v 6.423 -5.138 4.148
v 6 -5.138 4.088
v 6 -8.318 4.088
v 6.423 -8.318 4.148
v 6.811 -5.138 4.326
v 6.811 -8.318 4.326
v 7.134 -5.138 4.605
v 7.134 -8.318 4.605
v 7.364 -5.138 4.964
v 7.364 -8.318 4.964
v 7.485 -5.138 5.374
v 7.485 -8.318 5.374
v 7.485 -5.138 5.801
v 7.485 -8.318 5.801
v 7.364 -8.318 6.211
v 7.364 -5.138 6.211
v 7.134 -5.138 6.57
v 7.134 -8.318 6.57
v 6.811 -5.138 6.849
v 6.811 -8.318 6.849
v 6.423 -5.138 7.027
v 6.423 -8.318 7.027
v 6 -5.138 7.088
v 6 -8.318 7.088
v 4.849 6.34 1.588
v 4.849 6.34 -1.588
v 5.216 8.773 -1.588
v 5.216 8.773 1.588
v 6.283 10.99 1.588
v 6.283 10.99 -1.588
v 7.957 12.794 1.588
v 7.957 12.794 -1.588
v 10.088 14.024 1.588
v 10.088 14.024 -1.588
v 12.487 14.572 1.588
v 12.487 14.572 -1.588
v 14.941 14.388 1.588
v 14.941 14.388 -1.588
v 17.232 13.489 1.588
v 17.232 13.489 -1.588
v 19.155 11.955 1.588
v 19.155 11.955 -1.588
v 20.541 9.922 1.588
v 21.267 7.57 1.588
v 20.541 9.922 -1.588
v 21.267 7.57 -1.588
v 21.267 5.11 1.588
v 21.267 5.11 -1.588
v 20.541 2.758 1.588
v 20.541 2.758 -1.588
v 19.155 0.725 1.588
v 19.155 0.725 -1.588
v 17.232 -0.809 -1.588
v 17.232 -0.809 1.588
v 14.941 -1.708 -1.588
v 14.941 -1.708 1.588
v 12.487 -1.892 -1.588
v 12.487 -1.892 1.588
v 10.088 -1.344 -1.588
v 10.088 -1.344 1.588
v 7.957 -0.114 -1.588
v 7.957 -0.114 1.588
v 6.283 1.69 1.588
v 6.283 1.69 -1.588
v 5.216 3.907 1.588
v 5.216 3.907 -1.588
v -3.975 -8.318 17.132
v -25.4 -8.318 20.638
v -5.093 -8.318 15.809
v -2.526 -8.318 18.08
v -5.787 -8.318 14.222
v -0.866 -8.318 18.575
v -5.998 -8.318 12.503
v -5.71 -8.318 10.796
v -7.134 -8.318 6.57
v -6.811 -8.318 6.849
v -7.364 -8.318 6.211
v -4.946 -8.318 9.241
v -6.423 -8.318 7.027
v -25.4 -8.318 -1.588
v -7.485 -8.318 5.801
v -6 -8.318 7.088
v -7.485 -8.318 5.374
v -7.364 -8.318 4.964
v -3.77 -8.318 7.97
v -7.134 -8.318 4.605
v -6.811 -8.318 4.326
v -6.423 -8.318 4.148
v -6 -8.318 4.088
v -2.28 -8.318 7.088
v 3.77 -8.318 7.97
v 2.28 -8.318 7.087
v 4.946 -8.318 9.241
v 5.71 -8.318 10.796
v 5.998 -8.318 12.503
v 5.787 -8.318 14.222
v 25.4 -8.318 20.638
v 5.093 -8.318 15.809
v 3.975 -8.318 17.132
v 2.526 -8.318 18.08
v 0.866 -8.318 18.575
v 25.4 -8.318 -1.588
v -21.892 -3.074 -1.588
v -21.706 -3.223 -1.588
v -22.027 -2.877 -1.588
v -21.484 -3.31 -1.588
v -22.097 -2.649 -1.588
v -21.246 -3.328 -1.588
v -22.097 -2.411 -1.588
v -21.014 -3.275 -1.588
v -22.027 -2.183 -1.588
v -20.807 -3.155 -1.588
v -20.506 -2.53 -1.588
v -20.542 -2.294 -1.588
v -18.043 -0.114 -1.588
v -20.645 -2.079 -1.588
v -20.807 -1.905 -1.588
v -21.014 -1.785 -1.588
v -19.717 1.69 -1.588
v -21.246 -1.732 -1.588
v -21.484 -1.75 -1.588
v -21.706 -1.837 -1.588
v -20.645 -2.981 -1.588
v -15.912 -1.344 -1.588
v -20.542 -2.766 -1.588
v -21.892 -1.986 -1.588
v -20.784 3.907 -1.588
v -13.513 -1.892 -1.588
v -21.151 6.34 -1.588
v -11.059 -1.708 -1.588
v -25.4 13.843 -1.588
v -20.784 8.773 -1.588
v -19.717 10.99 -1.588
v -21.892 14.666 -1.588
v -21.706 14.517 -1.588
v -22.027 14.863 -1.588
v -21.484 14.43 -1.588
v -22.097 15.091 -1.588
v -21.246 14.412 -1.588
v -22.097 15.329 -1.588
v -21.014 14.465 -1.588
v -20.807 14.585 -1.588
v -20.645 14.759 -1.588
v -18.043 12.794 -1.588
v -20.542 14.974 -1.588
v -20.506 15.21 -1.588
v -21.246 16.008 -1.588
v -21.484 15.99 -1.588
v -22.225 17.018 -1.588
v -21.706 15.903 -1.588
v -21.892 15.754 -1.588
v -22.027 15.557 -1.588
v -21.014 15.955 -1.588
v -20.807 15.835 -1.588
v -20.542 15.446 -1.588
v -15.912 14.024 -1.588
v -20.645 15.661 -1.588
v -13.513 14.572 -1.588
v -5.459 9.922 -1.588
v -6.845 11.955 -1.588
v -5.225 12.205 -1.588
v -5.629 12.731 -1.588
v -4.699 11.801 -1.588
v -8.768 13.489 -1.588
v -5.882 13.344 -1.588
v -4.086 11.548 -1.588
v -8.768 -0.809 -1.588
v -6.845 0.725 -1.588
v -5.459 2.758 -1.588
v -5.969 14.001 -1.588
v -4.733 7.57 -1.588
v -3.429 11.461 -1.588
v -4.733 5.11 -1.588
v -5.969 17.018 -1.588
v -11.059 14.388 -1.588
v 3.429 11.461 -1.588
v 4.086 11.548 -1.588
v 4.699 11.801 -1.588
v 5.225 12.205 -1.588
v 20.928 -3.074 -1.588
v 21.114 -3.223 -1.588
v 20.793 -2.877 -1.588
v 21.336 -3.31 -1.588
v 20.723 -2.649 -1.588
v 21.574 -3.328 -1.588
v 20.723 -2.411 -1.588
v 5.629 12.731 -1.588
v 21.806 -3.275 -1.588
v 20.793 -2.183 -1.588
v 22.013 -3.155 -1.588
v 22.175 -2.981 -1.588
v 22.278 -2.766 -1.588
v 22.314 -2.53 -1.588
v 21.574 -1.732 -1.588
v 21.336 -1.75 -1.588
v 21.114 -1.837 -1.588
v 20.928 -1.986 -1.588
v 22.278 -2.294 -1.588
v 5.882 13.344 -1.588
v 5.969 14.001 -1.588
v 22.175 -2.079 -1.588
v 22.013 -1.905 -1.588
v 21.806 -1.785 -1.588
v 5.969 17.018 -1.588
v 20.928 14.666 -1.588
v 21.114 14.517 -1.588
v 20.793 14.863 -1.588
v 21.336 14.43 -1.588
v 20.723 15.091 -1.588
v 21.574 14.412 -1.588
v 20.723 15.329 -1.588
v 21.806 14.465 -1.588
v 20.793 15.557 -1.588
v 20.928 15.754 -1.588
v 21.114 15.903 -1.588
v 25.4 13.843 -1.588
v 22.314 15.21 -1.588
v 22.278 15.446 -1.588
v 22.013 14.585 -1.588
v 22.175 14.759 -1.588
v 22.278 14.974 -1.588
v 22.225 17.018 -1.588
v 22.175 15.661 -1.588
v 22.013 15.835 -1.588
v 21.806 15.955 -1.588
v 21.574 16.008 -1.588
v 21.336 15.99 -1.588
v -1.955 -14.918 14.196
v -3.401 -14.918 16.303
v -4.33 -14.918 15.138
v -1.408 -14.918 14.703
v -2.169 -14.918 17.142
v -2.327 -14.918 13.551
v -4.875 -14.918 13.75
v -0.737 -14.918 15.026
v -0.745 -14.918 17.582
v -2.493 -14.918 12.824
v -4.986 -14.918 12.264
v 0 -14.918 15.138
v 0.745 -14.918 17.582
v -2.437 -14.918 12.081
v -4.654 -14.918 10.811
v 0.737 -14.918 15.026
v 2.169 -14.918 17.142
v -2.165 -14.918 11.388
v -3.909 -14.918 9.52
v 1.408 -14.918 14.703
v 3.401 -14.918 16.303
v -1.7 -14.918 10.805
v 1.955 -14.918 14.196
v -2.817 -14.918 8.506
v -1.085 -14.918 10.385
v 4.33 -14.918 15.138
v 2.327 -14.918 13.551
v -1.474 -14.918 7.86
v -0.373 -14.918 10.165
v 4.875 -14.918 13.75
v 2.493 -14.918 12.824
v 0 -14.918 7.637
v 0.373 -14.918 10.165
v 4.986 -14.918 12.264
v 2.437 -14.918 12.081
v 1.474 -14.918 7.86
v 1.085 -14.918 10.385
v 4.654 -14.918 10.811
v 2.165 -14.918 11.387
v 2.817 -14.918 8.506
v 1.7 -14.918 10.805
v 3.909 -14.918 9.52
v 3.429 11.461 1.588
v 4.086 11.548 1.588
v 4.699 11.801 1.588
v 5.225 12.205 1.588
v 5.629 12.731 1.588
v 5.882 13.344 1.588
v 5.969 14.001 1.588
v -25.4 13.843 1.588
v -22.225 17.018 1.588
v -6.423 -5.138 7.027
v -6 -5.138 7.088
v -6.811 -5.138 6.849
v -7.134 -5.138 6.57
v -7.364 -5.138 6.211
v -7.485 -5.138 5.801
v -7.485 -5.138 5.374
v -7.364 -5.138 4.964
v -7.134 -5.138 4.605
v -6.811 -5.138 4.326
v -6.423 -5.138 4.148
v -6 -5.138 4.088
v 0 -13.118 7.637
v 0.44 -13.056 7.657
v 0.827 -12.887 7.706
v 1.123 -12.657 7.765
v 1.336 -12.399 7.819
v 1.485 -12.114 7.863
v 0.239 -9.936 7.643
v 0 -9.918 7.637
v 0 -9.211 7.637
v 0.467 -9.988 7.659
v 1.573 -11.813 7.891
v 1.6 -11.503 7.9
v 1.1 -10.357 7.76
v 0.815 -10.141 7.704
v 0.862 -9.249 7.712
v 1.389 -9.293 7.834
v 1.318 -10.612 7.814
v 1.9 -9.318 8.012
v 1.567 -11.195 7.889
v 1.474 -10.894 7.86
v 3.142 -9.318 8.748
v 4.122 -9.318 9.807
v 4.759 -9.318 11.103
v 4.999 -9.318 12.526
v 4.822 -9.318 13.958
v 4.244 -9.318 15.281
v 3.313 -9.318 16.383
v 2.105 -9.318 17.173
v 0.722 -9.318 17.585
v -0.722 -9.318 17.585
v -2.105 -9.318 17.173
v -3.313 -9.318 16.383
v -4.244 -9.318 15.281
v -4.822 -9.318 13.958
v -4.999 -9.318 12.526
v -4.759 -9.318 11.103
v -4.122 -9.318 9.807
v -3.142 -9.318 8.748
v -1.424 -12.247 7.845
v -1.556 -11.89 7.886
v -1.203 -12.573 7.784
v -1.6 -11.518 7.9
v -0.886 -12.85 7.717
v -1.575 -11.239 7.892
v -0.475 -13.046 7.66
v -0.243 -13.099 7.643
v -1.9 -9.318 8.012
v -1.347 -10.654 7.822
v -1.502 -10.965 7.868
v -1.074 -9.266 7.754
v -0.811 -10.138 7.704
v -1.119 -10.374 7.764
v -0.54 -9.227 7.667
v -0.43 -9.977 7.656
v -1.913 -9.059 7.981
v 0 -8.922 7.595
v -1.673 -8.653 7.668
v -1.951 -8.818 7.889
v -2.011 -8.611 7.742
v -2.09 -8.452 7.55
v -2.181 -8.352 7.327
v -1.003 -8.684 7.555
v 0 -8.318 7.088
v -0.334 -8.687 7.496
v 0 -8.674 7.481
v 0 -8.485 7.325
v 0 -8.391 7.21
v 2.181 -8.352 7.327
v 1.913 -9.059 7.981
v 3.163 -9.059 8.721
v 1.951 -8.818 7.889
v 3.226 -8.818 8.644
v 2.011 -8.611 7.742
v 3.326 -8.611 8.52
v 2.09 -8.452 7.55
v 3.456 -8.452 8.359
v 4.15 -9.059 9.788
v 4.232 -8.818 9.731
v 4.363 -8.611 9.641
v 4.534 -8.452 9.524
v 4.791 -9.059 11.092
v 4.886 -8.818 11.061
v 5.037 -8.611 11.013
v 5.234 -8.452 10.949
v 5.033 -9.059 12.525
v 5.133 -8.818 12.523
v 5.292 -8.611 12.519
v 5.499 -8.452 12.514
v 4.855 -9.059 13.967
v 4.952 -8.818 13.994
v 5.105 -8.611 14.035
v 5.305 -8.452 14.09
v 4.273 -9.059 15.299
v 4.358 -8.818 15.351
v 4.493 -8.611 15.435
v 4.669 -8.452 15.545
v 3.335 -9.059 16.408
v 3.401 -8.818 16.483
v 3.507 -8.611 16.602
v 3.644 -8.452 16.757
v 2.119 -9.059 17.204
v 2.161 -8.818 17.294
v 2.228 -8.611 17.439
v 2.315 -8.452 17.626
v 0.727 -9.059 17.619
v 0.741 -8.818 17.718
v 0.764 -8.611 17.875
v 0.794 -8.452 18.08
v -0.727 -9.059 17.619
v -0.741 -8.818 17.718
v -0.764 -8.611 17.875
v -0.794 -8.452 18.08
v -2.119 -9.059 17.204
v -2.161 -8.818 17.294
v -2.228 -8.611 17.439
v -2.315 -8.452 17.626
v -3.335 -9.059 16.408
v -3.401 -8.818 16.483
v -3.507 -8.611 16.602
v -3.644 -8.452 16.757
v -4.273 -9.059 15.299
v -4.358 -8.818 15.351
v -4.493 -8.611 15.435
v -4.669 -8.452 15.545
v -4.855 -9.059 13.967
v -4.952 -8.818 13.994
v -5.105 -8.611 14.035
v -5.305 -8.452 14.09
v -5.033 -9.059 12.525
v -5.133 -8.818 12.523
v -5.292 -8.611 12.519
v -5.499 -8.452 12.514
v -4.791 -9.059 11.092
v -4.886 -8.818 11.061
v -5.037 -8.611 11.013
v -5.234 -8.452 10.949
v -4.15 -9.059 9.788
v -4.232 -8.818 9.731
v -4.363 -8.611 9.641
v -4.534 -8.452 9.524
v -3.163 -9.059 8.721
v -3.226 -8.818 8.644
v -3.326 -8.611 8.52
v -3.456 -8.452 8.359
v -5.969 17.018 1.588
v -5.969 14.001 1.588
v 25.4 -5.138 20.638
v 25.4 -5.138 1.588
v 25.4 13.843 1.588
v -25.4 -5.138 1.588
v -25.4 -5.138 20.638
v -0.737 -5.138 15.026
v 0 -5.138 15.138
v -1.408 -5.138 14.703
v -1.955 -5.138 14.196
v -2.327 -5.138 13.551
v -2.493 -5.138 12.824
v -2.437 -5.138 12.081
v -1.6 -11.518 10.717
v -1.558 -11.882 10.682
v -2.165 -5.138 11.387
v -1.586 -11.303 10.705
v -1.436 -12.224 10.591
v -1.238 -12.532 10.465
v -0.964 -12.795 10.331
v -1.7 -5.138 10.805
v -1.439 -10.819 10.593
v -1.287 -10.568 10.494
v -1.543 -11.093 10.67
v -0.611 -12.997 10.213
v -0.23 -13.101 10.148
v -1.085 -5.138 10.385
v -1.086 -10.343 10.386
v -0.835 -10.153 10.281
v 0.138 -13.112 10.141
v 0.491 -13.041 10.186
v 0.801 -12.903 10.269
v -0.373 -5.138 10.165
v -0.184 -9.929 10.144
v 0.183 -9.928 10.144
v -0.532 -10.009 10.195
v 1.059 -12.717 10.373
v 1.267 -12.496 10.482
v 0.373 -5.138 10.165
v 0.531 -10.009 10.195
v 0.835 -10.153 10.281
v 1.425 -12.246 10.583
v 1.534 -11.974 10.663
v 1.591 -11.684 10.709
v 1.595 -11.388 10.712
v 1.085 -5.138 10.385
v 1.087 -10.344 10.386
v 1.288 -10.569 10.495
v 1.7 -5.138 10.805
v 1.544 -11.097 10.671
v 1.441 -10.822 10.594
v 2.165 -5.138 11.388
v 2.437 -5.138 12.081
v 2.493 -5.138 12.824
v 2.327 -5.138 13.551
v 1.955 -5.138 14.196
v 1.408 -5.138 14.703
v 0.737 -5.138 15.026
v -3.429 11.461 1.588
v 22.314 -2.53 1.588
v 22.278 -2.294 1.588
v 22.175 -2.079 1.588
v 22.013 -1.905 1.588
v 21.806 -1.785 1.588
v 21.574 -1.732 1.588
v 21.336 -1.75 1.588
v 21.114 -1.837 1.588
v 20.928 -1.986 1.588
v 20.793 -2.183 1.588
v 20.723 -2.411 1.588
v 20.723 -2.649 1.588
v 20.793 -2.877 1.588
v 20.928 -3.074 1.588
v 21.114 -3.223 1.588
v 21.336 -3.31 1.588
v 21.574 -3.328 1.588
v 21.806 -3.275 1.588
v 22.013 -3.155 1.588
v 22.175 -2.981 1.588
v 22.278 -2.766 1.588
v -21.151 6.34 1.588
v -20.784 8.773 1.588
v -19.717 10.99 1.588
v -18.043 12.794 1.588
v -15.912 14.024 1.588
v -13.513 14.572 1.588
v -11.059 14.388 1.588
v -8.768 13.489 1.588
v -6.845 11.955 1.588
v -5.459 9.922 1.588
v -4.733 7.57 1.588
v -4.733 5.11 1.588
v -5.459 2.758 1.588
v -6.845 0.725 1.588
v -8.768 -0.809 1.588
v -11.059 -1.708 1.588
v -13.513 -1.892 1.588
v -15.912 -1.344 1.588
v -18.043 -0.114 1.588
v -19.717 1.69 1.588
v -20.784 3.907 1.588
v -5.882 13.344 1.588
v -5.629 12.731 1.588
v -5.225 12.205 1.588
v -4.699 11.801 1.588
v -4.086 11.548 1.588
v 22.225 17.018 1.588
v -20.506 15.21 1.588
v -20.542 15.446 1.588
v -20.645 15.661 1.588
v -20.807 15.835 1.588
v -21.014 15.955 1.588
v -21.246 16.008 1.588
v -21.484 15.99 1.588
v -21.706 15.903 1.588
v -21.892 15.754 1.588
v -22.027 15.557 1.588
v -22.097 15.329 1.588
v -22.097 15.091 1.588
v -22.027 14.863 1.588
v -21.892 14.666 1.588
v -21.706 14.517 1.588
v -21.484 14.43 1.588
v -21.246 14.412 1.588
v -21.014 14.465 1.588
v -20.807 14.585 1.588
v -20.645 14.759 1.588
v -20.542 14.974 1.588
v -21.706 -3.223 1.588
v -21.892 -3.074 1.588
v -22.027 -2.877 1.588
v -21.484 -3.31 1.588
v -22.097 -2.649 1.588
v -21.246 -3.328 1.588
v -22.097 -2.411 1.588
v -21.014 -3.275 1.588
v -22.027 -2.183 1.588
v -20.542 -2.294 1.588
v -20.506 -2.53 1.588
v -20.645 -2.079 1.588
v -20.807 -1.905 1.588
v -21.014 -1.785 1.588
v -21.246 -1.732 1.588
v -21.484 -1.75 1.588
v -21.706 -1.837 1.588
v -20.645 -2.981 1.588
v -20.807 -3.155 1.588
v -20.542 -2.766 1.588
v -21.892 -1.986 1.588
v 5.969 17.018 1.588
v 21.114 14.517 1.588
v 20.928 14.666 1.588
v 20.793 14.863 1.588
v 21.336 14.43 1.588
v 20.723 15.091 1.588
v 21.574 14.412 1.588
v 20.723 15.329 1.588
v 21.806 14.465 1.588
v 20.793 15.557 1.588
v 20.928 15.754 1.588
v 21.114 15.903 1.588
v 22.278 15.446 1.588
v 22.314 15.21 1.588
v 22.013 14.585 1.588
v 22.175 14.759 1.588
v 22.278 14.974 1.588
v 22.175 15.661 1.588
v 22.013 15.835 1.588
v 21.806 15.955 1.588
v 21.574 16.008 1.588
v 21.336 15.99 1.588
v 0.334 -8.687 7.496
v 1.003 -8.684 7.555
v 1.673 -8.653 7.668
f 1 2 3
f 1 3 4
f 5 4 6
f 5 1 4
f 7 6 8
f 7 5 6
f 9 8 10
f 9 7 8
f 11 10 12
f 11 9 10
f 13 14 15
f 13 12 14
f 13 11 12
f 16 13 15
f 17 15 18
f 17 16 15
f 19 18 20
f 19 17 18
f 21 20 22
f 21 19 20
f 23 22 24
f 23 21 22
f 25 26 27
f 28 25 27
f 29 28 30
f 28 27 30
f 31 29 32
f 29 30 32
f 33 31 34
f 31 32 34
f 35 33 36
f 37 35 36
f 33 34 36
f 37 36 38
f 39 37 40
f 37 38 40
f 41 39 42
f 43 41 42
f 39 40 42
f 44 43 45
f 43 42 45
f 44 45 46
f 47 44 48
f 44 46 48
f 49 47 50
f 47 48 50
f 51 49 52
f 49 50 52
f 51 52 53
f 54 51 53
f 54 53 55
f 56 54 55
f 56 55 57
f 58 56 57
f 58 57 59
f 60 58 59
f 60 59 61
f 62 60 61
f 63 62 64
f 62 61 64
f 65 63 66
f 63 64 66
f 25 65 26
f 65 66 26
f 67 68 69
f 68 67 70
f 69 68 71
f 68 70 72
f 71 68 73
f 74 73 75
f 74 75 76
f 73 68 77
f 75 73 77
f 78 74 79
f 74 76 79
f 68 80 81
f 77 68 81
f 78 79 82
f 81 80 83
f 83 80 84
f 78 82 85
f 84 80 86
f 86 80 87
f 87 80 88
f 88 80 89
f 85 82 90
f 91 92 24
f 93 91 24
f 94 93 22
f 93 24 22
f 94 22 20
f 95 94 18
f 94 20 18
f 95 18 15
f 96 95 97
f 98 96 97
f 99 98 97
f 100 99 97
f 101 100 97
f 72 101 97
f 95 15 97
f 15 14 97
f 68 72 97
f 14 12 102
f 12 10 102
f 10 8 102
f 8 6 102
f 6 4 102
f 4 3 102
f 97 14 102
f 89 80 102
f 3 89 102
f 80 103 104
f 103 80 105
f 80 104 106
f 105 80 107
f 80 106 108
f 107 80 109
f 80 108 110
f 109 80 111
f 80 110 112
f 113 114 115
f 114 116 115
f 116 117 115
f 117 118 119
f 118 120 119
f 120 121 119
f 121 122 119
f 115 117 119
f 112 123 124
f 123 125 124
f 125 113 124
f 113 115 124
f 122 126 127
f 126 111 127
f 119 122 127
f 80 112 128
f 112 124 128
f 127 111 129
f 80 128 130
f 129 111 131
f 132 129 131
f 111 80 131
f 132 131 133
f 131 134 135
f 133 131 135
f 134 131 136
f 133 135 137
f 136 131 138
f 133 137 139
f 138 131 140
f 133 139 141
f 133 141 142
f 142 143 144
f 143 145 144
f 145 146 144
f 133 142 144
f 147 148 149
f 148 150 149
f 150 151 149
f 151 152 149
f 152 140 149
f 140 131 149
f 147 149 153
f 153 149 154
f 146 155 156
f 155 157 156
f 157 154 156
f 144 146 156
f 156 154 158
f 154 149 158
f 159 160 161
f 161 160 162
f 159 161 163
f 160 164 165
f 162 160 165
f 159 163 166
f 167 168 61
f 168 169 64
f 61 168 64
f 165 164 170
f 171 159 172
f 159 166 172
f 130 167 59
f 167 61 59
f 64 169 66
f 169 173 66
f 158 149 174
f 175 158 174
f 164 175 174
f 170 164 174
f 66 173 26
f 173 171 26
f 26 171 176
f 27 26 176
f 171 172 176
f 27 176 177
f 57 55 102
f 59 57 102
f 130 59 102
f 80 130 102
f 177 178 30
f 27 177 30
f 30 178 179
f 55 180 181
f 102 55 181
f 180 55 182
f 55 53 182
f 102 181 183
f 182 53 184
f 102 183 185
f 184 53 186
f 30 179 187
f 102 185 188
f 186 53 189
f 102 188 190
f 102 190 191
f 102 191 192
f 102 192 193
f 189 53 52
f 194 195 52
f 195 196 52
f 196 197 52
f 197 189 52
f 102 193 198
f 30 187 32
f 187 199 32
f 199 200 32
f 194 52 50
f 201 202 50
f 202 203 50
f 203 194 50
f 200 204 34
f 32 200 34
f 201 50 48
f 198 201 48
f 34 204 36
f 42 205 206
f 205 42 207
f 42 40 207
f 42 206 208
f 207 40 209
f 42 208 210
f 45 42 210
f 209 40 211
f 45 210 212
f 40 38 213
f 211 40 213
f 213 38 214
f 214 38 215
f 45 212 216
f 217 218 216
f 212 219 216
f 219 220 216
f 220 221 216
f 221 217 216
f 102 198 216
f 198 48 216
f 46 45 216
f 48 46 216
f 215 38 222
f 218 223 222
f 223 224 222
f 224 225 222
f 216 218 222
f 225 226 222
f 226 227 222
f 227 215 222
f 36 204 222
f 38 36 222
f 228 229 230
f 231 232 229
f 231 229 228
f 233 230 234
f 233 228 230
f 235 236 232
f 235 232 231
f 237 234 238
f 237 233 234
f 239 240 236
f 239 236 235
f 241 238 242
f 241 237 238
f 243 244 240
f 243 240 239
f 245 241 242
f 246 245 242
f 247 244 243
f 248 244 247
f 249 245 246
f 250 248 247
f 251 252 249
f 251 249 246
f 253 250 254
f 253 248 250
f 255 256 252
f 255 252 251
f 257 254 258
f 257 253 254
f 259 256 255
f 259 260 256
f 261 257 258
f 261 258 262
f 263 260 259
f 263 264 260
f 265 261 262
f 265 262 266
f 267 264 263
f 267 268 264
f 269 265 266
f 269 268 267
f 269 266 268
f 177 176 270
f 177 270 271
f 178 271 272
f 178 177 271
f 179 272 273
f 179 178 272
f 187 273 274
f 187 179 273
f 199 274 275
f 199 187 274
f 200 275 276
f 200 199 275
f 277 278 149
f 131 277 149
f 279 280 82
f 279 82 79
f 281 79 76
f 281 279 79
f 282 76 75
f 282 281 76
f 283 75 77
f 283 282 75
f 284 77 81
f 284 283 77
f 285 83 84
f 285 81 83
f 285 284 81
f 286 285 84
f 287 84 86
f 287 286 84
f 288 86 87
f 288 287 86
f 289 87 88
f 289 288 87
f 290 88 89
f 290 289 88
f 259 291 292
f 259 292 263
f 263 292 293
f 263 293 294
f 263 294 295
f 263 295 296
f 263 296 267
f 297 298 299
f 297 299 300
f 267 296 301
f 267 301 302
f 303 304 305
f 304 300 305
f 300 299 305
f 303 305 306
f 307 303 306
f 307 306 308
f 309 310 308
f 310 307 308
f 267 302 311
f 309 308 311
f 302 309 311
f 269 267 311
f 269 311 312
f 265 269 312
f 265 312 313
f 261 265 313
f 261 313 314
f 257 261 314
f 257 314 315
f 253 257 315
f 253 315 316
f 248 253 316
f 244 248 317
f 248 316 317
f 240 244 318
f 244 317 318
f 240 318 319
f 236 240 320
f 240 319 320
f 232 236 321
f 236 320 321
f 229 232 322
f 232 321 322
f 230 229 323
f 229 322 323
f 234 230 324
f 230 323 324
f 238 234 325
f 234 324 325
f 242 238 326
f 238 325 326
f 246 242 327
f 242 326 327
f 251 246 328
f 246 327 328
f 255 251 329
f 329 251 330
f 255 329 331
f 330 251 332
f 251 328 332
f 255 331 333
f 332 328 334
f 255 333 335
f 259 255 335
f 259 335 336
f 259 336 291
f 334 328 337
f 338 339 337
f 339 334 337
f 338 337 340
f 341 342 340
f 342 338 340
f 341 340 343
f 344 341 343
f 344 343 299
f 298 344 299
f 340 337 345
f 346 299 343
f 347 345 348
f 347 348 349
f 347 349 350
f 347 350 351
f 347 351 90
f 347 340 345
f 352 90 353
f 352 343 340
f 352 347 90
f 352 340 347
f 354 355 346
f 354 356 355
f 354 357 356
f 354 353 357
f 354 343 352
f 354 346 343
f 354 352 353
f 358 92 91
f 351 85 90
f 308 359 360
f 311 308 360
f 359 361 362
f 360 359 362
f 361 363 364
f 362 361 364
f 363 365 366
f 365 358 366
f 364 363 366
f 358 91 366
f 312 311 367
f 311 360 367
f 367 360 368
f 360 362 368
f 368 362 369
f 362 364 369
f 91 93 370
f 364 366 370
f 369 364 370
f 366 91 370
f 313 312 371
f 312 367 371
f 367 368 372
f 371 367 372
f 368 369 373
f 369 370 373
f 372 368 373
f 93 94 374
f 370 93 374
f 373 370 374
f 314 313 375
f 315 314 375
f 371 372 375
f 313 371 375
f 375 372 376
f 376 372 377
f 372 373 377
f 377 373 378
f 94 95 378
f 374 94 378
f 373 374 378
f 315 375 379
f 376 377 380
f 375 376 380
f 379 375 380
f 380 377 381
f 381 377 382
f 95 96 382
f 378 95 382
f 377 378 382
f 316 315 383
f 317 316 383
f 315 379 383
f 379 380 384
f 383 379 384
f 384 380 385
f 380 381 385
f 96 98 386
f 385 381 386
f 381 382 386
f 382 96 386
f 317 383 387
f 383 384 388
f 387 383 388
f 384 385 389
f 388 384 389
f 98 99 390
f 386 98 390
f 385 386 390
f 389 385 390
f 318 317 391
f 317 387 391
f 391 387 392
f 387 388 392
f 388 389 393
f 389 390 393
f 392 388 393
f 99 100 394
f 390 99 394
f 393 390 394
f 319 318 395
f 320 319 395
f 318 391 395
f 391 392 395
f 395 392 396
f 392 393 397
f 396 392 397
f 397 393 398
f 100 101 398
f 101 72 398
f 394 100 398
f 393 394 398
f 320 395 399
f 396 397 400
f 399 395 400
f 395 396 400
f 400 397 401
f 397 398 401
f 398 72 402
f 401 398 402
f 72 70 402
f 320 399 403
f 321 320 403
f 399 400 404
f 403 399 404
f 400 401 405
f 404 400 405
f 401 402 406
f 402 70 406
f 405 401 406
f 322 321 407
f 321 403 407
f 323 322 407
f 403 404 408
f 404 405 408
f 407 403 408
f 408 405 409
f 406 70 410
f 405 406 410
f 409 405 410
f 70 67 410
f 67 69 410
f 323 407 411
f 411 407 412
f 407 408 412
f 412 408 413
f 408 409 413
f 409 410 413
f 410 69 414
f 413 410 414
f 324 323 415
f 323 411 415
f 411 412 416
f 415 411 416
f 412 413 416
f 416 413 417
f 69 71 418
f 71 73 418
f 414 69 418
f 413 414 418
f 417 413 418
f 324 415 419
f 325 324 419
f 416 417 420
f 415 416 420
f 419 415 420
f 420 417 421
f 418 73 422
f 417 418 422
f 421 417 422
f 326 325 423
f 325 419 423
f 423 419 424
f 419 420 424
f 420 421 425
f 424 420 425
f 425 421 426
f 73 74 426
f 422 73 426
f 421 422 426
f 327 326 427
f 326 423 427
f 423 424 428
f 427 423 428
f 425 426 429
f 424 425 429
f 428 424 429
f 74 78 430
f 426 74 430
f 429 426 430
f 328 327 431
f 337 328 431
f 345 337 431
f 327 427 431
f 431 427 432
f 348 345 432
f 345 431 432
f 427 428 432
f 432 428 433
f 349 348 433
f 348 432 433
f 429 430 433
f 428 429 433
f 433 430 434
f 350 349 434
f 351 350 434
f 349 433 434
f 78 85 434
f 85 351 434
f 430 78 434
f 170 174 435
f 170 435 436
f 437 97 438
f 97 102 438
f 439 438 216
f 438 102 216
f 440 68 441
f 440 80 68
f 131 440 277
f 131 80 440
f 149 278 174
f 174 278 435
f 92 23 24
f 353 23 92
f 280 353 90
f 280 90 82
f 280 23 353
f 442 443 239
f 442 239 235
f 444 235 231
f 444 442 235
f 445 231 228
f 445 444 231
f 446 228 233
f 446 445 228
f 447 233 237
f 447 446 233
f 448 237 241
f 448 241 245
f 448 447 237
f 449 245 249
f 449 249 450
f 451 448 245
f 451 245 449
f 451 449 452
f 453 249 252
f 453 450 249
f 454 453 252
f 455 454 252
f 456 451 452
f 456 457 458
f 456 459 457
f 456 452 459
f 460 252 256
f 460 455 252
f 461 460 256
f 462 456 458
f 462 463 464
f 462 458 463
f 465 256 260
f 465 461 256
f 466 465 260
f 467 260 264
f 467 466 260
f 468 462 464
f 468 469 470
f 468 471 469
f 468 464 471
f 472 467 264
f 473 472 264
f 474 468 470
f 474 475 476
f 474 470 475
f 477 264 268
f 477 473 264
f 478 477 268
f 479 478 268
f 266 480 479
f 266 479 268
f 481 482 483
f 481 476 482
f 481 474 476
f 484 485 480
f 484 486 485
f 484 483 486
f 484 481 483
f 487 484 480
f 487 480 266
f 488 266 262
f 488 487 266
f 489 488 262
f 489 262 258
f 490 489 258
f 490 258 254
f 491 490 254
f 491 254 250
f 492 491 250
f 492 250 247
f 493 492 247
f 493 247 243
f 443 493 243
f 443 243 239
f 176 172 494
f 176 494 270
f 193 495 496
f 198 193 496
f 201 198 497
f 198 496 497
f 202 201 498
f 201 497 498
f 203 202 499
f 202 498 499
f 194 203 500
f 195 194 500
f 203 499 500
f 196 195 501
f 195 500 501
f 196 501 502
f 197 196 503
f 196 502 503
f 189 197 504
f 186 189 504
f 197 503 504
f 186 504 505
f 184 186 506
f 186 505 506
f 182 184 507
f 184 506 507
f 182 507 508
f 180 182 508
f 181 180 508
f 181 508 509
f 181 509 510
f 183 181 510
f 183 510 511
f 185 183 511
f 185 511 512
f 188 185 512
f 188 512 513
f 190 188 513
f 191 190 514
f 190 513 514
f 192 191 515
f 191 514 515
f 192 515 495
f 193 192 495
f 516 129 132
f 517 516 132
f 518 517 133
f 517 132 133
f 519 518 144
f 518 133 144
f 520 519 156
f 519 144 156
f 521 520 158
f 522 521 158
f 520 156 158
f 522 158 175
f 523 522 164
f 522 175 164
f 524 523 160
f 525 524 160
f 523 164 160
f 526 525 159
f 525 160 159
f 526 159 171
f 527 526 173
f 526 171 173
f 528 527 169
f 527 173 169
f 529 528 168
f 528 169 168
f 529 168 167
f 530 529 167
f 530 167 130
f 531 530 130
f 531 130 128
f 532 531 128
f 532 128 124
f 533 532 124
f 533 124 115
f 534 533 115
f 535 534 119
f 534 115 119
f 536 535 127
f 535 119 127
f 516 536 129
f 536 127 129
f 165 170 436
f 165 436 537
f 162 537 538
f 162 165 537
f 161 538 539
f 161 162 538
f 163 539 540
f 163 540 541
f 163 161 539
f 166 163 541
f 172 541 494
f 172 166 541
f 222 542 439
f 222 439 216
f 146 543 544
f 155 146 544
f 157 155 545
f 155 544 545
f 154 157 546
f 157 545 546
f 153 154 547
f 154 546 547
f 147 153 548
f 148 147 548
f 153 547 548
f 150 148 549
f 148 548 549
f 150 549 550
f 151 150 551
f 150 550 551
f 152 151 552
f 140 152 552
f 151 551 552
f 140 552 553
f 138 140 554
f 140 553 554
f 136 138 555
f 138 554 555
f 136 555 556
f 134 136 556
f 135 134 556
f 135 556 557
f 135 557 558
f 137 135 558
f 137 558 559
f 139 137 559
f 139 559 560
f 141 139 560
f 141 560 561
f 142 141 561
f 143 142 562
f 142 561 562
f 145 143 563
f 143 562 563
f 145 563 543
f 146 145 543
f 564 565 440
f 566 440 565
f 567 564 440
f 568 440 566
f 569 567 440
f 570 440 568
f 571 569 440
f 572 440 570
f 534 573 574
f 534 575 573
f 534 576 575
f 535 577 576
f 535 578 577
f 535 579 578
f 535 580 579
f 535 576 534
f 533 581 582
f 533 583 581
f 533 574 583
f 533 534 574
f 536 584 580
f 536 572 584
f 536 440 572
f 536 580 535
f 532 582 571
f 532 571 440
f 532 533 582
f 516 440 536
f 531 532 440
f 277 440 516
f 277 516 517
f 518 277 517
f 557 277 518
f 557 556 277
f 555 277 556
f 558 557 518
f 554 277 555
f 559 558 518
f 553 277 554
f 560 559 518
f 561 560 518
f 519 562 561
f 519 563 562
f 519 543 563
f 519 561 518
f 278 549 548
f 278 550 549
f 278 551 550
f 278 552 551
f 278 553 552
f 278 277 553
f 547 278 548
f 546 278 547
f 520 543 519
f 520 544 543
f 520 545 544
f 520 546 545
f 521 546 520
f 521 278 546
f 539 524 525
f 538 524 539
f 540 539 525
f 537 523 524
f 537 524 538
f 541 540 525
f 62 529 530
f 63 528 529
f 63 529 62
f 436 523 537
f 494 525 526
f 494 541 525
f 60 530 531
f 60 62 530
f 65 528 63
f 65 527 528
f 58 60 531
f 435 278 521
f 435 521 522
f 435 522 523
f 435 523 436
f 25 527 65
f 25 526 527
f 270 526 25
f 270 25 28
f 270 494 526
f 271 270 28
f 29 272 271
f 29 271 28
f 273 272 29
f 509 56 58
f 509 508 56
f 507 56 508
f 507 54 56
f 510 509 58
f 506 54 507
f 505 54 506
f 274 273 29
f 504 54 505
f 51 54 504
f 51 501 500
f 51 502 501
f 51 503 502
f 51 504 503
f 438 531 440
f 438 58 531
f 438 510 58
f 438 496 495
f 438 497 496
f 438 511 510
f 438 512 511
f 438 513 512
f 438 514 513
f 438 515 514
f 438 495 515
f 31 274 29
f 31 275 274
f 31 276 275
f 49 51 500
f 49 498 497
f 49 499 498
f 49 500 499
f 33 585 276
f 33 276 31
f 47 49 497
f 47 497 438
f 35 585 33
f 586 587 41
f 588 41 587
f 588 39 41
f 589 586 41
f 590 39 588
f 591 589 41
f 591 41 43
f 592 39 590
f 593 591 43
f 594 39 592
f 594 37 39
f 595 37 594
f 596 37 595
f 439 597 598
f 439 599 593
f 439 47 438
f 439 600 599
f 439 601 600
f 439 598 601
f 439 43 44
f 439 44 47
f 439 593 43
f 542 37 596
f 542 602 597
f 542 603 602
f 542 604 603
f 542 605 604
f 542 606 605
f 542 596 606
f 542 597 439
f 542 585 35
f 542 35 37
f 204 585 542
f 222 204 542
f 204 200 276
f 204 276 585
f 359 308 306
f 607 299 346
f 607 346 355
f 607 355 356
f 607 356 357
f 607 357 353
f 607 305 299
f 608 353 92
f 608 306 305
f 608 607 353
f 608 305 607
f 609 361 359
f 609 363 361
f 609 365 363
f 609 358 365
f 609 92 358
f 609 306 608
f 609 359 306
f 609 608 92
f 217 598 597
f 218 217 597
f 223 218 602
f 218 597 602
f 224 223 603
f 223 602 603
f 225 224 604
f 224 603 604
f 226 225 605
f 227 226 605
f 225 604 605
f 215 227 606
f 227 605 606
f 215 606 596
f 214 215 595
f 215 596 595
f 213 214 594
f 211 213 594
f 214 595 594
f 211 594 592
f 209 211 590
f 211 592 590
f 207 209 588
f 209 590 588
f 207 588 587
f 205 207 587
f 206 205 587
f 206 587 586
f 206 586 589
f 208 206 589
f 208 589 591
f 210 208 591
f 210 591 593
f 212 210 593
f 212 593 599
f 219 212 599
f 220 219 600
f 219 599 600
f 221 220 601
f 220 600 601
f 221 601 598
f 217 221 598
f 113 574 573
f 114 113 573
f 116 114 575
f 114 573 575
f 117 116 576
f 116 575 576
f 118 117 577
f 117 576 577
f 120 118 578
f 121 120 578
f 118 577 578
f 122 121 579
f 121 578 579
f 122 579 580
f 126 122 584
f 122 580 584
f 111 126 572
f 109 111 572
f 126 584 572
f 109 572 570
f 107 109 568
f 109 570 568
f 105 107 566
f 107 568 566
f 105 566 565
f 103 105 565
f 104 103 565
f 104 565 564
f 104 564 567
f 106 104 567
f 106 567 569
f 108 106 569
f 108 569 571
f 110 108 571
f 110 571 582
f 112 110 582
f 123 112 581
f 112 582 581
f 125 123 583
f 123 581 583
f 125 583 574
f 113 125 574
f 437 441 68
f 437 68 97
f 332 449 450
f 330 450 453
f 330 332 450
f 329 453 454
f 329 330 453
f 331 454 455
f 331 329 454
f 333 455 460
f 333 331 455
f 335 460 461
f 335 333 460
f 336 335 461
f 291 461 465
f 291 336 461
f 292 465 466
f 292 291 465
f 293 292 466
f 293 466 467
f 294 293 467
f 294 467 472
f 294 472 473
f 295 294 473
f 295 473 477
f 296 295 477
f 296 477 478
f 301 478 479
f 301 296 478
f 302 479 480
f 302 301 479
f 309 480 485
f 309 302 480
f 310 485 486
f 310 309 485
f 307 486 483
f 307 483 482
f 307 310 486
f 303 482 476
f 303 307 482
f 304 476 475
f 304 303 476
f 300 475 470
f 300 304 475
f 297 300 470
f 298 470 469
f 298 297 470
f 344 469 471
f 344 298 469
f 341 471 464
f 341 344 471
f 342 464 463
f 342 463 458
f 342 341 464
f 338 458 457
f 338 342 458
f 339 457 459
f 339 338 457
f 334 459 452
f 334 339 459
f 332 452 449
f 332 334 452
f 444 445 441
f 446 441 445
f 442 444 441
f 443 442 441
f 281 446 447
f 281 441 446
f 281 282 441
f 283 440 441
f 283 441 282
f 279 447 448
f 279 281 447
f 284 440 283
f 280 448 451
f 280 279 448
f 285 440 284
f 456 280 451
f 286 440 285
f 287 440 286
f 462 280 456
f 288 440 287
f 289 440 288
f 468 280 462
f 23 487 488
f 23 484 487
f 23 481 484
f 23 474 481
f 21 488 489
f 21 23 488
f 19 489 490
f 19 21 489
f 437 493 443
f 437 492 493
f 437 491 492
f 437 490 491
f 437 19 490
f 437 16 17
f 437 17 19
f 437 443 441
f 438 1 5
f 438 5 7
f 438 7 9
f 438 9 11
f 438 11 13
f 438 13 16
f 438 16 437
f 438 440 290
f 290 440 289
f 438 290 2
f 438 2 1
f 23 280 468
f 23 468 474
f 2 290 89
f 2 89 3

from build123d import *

# Parameters (mm, degrees)
SKETCH1_W                = 50.8
SKETCH1_H                = 34.036
BOSS_EXTRUDE1_DEPTH      = 1.5875
CHAMFER2_SIZE            = 3.175
CUT_EXTRUDE1_DEPTH       = 3.175
SKETCH7_R                = 8.255
CUT_EXTRUDE3_DEPTH       = 3.175
SKETCH8_R                = 8.255
CUT_EXTRUDE4_DEPTH       = 3.175
SKETCH9_R                = 0.8
CUT_EXTRUDE5_DEPTH       = 3.175
SKETCH_1_W               = 50.8
SKETCH_1_H               = 8.7
CUT_EXTRUDE_1_DEPTH      = 10
SKETCH_2_W               = 50.8
SKETCH_2_H               = 3.18
EXTRUDE_1_DEPTH          = 19.05
CUT_EXTRUDE_2_DEPTH      = 10
SKETCH_3_R               = 2.5
CUT_EXTRUDE_3_DEPTH      = 10
SKETCH_5_R               = 5
SKETCH_5_R_2             = 2.5
EXTRUDE_2_DEPTH          = 6.6
CUT_EXTRUDE_4_REACH      = 38.887
CUT_EXTRUDE_4_END_RADIUS = 2.5
SKETCH_6_R               = 1.6
FILLET_1_R               = 1


with BuildPart() as part:
    # Sketch1 → Boss-Extrude1 (new, symmetric)
    with BuildSketch(Plane.XY):
        Rectangle(SKETCH1_W, SKETCH1_H)
    extrude(amount=BOSS_EXTRUDE1_DEPTH, both=True)

    # Chamfer2
    chamfer2_edges = [part.edges().sort_by_distance(p)[0] for p in [
        (-25.4, 17.018, 0),
        (25.4, 17.018, 0),
    ]]
    chamfer(chamfer2_edges, length=CHAMFER2_SIZE)

    # Sketch5 → Cut-Extrude1 (cut)
    with BuildSketch(Plane(origin=(0, 0, -1.5875), x_dir=(-1, 0, 0), z_dir=(0, 0, -1))):
        with BuildLine():
            Line((-5.969, 14.001104381), (-5.969, 17.018))
            Line((-5.969, 17.018), (5.969, 17.018))
            Line((5.969, 17.018), (5.969, 14.001104381))
            ThreePointArc((5.969, 14.001104381), (5.225051224, 12.205053157), (3.429, 11.461104381))
            Line((3.429, 11.461104381), (-3.429, 11.461104381))
            ThreePointArc((-3.429, 11.461104381), (-5.225051224, 12.205053157), (-5.969, 14.001104381))
        make_face()
    extrude(amount=-CUT_EXTRUDE1_DEPTH, mode=Mode.SUBTRACT)

    # Sketch7 → Cut-Extrude3 (cut)
    with BuildSketch(Plane(origin=(0, 0, -1.5875), x_dir=(-1, 0, 0), z_dir=(0, 0, -1))):
        with Locations((12.896, 6.34)):
            Circle(SKETCH7_R)
    extrude(amount=-CUT_EXTRUDE3_DEPTH, mode=Mode.SUBTRACT)

    # Sketch8 → Cut-Extrude4 (cut)
    with BuildSketch(Plane(origin=(0, 0, -1.5875), x_dir=(-1, 0, 0), z_dir=(0, 0, -1))):
        with Locations((-13.104, 6.34)):
            Circle(SKETCH8_R)
    extrude(amount=-CUT_EXTRUDE4_DEPTH, mode=Mode.SUBTRACT)

    # Sketch9 → Cut-Extrude5 (cut)
    with BuildSketch(Plane.XY.offset(1.5875)):
        with Locations((-21.306, 15.21)):
            Circle(SKETCH9_R)
        with Locations((21.514, 15.21)):
            Circle(SKETCH9_R)
        with Locations((21.514, -2.53)):
            Circle(SKETCH9_R)
        with Locations((-21.306, -2.53)):
            Circle(SKETCH9_R)
    extrude(amount=-CUT_EXTRUDE5_DEPTH, mode=Mode.SUBTRACT)

    # 草图1 → 切除-拉伸1 (cut)
    with BuildSketch(Plane.XY.offset(1.5875)):
        with Locations((0, -12.668)):
            Rectangle(SKETCH_1_W, SKETCH_1_H)
    extrude(amount=-CUT_EXTRUDE_1_DEPTH, mode=Mode.SUBTRACT)

    # 草图2 → 凸台-拉伸1 (add)
    with BuildSketch(Plane.XY.offset(1.5875)):
        with Locations((0, -6.728)):
            Rectangle(SKETCH_2_W, SKETCH_2_H)
    extrude(amount=EXTRUDE_1_DEPTH)

    # 草图4 → 切除-拉伸2 (cut)
    with BuildSketch(Plane(origin=(0, -5.138, 0), x_dir=(1, 0, 0), z_dir=(0, 1, 0))):
        with BuildLine():
            Line((-6, -4.0875), (6, -4.0875))
            ThreePointArc((6, -4.0875), (7.5, -5.5875), (6, -7.0875))
            Line((6, -7.0875), (-6, -7.0875))
            ThreePointArc((-6, -7.0875), (-7.5, -5.5875), (-6, -4.0875))
        make_face()
    extrude(amount=-CUT_EXTRUDE_2_DEPTH, mode=Mode.SUBTRACT)

    # 草图3 → 切除-拉伸3 (cut)
    with BuildSketch(Plane(origin=(0, -5.138, 0), x_dir=(1, 0, 0), z_dir=(0, 1, 0))):
        with Locations(Location((0, -12.6375, 0), (0, 0, 270))):
            Circle(SKETCH_3_R)
    extrude(amount=-CUT_EXTRUDE_3_DEPTH, mode=Mode.SUBTRACT)

    # 草图5 → 凸台-拉伸2 (add)
    with BuildSketch(Plane.XZ.offset(8.318)):
        with Locations(Location((0, 12.6375, 0), (0, 0, 270))):
            Circle(SKETCH_5_R)
        with Locations(Location((0, 12.6375, 0), (0, 0, 90))):
            Circle(SKETCH_5_R_2, mode=Mode.SUBTRACT)
    extrude(amount=EXTRUDE_2_DEPTH)

    # 切除-拉伸4: up to this cylinder (the profile starts outside it)
    cut_extrude_4_end = Plane(origin=(0, -11.518, 12.6375), z_dir=(0, 1, 0)) * Cylinder(CUT_EXTRUDE_4_END_RADIUS, 83.774, mode=Mode.PRIVATE)
    # 草图6 → 切除-拉伸4 (cut, up to the surface)
    with BuildSketch(Plane.XY, mode=Mode.PRIVATE) as cut_extrude_4_sk1:
        with Locations(Location((0, -11.518, 0), (0, 0, 180))):
            Circle(SKETCH_6_R)
    cut_extrude_4_tool1 = extrude(cut_extrude_4_sk1.sketch, amount=CUT_EXTRUDE_4_REACH, mode=Mode.PRIVATE) - cut_extrude_4_end
    add(cut_extrude_4_tool1.solids().sort_by_distance((0, -11.518, 0))[0], mode=Mode.SUBTRACT)

    # 圆角1
    fillet_1_edges = [part.edges().sort_by_distance(p)[0] for p in [
        (0, -8.318, 17.6375),
    ]]
    fillet(fillet_1_edges, radius=FILLET_1_R)


solid = part.part
